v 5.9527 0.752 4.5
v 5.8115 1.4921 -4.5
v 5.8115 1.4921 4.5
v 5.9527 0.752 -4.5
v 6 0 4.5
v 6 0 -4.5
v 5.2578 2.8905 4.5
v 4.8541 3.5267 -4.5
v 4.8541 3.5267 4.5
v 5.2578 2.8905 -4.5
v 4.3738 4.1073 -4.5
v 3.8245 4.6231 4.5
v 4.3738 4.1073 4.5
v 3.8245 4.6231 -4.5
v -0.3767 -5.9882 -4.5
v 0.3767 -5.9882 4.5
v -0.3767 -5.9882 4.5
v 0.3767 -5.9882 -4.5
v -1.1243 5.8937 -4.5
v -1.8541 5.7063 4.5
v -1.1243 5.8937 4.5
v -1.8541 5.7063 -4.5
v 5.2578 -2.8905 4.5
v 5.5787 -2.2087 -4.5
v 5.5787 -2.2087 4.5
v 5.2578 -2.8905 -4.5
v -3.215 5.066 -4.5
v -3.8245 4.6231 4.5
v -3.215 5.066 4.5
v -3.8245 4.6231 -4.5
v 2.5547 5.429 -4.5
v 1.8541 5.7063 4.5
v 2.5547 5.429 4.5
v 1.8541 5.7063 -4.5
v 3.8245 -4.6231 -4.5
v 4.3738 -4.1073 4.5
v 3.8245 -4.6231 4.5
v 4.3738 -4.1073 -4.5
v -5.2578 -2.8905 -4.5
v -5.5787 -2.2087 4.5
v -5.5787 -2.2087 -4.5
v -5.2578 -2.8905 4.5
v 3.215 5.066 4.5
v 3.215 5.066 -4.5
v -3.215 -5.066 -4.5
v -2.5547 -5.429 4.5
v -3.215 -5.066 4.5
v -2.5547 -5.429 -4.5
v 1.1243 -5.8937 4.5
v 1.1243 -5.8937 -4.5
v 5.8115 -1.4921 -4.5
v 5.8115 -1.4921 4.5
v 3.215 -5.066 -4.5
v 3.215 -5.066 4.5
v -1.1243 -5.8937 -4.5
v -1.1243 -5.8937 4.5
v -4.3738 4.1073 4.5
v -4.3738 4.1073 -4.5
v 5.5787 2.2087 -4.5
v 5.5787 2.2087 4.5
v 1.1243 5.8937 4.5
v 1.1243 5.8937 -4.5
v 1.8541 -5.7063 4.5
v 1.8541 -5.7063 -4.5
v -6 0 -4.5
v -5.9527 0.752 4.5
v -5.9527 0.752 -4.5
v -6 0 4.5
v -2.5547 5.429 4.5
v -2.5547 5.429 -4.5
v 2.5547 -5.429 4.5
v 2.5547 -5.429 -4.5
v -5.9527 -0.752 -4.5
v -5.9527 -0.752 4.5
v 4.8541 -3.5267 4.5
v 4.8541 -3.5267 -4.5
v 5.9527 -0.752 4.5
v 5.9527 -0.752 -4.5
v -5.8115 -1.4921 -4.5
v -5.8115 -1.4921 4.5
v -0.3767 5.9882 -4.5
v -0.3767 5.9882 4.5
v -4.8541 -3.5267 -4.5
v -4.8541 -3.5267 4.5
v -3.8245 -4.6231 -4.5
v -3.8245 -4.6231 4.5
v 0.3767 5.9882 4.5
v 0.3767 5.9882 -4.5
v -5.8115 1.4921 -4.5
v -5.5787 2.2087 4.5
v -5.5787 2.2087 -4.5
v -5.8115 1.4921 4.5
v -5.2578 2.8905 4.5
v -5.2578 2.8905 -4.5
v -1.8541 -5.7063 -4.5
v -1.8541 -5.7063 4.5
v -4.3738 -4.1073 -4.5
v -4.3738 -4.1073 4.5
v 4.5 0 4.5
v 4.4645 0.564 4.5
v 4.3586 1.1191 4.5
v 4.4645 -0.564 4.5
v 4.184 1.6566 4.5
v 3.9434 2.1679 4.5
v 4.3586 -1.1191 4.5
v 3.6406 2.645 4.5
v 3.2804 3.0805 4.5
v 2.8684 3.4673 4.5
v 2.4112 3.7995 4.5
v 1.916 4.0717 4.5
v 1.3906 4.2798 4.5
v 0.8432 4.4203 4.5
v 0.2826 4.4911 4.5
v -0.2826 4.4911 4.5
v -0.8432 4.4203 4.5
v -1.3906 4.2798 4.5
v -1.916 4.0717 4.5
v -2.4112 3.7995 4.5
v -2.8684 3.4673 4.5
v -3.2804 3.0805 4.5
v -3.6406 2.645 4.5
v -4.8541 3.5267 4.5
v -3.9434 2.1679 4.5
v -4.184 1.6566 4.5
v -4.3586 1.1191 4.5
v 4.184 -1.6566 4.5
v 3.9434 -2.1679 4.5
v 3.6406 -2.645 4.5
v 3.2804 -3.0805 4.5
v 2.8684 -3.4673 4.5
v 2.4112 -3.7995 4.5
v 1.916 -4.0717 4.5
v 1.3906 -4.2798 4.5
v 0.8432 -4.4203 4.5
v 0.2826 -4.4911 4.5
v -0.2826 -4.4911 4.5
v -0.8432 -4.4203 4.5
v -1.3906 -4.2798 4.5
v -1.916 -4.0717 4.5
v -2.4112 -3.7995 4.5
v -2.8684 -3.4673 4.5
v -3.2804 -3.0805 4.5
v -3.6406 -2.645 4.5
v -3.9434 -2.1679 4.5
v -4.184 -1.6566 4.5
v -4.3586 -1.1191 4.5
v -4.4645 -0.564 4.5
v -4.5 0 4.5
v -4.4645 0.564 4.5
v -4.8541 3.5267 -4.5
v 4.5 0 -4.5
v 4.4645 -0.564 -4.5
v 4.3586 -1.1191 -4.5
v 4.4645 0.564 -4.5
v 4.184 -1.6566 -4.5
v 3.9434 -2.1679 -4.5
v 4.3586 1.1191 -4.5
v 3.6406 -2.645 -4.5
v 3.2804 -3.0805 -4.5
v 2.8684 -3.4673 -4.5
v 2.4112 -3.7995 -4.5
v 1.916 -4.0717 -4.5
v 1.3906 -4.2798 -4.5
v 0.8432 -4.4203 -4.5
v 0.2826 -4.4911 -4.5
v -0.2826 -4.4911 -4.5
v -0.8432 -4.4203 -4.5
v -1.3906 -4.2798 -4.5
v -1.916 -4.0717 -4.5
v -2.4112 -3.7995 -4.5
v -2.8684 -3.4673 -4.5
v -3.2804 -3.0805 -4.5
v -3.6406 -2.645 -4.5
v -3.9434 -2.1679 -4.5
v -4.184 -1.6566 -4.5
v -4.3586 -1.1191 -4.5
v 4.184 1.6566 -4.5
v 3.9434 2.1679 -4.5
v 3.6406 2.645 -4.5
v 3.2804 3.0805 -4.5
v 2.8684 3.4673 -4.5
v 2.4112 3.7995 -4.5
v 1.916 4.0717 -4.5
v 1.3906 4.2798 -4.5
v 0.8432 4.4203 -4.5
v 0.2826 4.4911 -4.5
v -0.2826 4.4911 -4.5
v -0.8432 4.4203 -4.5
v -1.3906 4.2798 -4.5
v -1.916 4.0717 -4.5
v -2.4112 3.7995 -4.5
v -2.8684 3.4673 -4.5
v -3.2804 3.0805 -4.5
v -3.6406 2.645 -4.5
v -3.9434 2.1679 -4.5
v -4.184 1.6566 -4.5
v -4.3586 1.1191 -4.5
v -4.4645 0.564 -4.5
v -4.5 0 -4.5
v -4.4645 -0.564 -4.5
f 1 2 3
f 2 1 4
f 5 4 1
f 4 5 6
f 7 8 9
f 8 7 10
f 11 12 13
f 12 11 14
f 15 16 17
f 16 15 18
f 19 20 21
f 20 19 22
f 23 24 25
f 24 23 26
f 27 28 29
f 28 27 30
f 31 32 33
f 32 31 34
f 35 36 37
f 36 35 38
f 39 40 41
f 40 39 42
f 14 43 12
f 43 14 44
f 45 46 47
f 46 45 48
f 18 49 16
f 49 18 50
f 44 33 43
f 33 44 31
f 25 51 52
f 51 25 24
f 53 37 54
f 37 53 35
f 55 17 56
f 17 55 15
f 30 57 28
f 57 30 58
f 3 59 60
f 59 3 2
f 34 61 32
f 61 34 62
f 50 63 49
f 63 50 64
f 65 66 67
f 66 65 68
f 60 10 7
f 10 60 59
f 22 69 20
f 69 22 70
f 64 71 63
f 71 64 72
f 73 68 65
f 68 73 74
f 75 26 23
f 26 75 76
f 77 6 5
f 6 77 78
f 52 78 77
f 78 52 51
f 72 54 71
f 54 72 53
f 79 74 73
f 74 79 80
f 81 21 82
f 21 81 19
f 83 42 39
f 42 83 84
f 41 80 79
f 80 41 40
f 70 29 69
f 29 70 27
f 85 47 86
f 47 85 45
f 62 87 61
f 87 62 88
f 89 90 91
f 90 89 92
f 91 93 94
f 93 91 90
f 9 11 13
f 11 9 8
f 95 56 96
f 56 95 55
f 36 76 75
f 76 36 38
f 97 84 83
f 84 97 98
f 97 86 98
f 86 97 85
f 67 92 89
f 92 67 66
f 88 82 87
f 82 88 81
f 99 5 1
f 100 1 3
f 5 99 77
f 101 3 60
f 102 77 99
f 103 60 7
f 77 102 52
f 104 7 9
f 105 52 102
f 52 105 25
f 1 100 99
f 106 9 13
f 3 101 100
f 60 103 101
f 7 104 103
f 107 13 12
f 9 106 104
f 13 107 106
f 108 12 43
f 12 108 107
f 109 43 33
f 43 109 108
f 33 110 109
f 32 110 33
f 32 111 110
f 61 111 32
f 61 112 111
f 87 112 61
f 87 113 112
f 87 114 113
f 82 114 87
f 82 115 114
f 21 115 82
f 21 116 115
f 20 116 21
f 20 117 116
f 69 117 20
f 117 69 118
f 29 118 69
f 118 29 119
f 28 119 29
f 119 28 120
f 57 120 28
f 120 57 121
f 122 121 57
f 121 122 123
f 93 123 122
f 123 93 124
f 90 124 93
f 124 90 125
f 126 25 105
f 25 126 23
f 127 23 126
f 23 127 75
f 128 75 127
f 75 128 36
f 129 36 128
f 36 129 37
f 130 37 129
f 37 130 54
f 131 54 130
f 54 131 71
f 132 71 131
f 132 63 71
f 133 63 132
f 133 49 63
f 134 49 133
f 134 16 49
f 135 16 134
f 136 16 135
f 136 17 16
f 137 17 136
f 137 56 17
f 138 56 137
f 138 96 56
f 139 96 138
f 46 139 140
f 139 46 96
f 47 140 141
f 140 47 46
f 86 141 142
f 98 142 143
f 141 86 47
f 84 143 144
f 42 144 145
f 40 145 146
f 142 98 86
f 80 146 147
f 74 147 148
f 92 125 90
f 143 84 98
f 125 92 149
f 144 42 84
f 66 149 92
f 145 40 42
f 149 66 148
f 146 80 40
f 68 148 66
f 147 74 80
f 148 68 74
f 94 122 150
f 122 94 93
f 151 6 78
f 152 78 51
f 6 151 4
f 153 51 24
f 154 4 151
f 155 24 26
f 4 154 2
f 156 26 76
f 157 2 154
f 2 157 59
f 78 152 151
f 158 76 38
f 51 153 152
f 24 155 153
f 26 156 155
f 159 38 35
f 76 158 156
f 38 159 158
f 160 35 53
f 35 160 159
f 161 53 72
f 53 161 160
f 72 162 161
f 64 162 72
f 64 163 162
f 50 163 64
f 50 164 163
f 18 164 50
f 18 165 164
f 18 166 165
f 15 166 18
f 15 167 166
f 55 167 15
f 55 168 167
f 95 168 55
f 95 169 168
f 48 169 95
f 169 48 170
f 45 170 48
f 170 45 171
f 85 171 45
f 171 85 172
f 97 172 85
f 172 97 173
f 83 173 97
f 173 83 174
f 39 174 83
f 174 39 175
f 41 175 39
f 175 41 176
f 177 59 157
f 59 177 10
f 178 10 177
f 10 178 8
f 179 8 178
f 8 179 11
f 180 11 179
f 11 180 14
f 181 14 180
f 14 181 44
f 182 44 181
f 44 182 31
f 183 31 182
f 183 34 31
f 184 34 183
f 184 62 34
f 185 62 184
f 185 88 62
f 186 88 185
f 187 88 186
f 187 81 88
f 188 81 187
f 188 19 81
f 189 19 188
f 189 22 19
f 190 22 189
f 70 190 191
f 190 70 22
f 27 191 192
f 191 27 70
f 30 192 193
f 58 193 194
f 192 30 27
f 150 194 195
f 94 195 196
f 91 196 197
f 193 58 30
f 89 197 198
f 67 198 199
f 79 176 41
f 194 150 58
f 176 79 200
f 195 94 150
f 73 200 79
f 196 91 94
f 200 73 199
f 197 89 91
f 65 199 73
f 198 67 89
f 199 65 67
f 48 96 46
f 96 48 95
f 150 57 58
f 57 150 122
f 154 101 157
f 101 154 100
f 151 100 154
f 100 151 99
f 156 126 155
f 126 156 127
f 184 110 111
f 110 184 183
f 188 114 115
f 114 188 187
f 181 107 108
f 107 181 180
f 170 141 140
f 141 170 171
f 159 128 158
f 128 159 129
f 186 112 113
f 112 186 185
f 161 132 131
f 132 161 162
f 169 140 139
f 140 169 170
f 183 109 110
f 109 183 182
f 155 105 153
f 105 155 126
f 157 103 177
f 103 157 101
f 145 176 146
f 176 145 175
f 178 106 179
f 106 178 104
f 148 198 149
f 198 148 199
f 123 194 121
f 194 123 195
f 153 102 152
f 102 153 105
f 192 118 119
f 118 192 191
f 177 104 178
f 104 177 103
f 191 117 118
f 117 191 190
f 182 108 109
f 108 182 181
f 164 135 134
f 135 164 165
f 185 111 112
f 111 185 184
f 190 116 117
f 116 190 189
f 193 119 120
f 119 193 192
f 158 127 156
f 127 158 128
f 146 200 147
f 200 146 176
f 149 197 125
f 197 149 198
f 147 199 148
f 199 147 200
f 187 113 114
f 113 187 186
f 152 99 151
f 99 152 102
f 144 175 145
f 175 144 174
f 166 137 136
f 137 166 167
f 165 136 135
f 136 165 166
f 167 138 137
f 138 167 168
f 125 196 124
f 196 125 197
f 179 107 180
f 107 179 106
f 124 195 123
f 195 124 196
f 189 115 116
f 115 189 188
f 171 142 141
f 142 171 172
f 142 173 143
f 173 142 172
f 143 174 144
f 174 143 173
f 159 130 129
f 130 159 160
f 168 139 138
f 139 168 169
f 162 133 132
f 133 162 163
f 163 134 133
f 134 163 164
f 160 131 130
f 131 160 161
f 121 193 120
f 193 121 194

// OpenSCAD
$fn = 50;


difference() {
	union() {
		translate(v = [0, 0, -4.5000000000]) {
			cylinder(h = 9, r = 6.0000000000);
		}
	}
	union() {
		translate(v = [0, 0, -100.0000000000]) {
			cylinder(h = 200, r = 4.5000000000);
		}
	}
}
